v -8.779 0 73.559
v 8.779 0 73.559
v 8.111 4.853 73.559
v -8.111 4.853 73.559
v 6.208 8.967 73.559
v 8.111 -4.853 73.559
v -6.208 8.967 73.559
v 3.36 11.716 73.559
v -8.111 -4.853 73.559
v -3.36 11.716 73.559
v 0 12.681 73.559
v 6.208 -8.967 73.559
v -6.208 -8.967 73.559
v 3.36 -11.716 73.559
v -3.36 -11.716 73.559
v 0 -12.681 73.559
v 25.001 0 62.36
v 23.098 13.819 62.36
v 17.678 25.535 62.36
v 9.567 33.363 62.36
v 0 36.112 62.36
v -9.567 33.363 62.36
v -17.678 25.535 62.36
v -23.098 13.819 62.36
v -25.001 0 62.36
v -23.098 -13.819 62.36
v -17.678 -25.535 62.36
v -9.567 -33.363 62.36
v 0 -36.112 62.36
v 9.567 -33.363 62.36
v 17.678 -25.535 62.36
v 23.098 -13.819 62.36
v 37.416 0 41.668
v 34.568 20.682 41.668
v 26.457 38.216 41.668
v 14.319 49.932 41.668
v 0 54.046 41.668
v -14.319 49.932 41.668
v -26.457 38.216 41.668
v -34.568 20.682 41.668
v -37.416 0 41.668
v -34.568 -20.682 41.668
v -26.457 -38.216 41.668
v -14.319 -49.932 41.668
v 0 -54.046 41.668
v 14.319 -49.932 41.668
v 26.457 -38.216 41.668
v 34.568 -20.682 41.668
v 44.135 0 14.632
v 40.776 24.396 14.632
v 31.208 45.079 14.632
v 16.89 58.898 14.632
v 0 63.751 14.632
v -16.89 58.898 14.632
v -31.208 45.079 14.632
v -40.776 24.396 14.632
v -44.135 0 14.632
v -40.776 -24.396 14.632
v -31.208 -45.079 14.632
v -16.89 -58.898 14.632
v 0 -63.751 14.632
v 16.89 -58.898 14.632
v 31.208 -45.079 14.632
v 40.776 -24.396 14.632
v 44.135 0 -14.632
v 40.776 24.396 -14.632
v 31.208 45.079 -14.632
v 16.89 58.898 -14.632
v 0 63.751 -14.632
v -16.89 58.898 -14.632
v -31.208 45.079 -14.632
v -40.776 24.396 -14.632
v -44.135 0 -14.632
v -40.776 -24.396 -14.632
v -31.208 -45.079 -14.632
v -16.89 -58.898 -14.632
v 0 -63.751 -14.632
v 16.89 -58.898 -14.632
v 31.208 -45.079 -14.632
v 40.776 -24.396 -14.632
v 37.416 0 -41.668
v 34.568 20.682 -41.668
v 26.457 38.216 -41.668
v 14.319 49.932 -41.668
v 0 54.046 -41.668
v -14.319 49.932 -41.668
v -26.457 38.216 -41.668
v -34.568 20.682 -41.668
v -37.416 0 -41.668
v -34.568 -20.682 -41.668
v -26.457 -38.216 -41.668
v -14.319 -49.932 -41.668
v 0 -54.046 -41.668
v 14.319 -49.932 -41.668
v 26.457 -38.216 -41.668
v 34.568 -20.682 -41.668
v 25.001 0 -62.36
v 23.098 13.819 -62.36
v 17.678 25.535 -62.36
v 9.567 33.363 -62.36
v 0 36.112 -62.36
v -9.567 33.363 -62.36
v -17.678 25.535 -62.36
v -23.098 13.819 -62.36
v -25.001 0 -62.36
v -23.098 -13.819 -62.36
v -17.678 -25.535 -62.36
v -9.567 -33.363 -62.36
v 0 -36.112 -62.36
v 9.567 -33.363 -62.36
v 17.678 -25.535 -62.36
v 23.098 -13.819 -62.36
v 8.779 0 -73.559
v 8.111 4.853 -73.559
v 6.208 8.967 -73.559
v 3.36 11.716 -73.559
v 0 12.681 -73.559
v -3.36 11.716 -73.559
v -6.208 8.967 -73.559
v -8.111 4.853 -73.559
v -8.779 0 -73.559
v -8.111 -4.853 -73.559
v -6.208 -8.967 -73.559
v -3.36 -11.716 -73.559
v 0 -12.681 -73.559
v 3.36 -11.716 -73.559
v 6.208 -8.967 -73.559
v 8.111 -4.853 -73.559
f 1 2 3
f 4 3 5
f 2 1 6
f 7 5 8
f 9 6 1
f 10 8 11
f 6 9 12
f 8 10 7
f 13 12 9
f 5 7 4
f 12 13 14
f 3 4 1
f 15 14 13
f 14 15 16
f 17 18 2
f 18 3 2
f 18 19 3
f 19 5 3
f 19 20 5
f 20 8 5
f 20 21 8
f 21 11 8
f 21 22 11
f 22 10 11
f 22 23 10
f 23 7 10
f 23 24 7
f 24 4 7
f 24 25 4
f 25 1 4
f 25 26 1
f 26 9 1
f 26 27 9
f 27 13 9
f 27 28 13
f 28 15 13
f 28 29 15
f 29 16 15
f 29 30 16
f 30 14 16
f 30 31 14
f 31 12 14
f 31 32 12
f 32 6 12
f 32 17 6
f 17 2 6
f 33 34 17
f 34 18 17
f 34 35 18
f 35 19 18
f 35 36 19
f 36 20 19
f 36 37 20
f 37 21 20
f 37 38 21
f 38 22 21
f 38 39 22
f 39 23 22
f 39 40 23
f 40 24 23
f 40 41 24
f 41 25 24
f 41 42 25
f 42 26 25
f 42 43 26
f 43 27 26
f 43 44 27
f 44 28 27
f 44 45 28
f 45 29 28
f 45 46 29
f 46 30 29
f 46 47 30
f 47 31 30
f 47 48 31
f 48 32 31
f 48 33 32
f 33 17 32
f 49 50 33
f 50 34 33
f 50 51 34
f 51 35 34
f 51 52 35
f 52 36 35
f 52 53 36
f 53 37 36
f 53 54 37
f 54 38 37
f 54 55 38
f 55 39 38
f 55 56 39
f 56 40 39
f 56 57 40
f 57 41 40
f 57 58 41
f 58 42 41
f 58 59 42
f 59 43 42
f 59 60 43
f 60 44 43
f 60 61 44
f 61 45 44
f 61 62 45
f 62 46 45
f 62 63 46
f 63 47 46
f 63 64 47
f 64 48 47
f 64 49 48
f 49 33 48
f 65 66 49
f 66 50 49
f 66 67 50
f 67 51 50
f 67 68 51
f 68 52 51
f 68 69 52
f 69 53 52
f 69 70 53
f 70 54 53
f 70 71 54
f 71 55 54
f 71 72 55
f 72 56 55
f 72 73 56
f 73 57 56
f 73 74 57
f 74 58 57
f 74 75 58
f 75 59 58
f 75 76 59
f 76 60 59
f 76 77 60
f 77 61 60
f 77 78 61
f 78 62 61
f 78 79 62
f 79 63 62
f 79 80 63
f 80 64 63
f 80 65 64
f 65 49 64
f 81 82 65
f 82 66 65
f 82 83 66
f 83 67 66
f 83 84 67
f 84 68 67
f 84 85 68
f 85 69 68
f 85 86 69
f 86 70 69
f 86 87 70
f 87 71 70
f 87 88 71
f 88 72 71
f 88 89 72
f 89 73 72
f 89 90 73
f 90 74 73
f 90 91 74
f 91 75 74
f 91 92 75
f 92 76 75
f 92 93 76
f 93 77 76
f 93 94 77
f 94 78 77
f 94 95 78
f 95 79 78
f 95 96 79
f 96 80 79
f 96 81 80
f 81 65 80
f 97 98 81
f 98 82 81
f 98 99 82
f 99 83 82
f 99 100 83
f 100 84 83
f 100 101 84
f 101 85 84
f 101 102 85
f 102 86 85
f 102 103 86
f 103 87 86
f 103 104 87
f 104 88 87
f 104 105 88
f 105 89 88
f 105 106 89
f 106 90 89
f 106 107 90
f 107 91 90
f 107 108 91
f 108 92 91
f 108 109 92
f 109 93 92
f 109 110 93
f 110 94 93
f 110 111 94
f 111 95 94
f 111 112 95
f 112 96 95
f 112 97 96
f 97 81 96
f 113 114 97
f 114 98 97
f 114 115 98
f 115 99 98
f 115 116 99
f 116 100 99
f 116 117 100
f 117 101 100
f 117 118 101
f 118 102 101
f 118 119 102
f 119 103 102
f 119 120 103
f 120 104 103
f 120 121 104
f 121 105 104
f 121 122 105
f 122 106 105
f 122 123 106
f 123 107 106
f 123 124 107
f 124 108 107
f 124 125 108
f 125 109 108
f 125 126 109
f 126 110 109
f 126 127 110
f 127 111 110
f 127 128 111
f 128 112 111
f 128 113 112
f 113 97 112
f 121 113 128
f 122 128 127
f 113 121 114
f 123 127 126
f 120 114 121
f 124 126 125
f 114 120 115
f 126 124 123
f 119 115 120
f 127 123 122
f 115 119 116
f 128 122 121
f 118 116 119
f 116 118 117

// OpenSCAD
// Generated by SolidPython 1.0.1 on 2020-07-29 00:46:49


scale(v = [9, 13, 15]) {
	sphere(r = 5);
}
/***********************************************
*********      SolidPython code:      **********
************************************************
 
# import packages: SolidPython
from solid import *
from solid.utils import *
from itertools import chain, combinations, permutations


class Resize:

    def __init__(self, scad_file):
        self.scad_file = scad_file
        #self.scad_file = import_scad(scad_file)
        # cone/cylinder param:
        self.r1 = 0
        self.r2 = 0
        self.h = 0
        # rectangular prism param:
        self.w = 0
        self.l = 0
        # ellipse param:
        self.r = 0

    # import OpenScad code (file name corresponds to shape)


    # classify shape + parameters
    def assign(self, param1, param2, param3):
        if self.scad_file == 'cone.scad':
            self.r1 = param1
            self.r2 = param2
            self.h = param3
        elif self.scad_file == 'cylinder.scad':
            self.r1 = param1
            self.r2 = param2
            self.h = param3
        elif self.scad_file == 'rectangularPrism.scad':
            self.h = param1
            self.l = param2
            self.w = param3
        else:
            self.r = param1
            self.h = param2

    # resize parameters
    def iterate(self):
        x = range(3, 20, 2)
        i = 1
        if self.scad_file == 'cone.scad':
            tempList = list(permutations(x, 2))
            for temp in tempList:
                param1 = temp[0]
                param2 = temp[1]
                filepath = 'produced_scad_files/' + 'cone' + str(param1) + '_' + str(param2) + '_' + '.scad'
                scad_render_to_file(cylinder(h=param1, r1=param2, r2=0), filepath)

        elif self.scad_file == 'cylinder.scad':
            tempList = list(permutations(x, 3))
            for temp in tempList:
                param1 = temp[0]
                param2 = temp[1]
                filepath = 'produced_scad_files/' + 'cylinder' + str(param1) + '_' + str(param2) + '_' + '.scad'
                scad_render_to_file(cylinder(h=param1, r1=param2, r2=param2), filepath)

        elif self.scad_file == 'rectangularPrism.scad':
            tempList = list(permutations(x, 3))
            for temp in tempList:
                param1 = temp[0]
                param2 = temp[1]
                param3 = temp[2]
                filepath = 'produced_scad_files/' + 'rectangularPrism' + str(param1) + '_' + str(param2) + '_' + str(
                    param3) + '.scad'
                scad_render_to_file(cube(size=(param1, param2, param3)), filepath)

        elif self.scad_file == 'ellipse.scad':
            tempList = list(permutations(x, 4))
            for temp in tempList:
                param1 = temp[0]
                param2 = temp[1]
                param3 = temp[2]
                param4 = temp[3]
                filepath = 'produced_scad_files/' + 'ellipse' + str(param1) + '_' + str(param2) + '_' + str(param3) + '_' + str(param4) + '.scad'
                scad_render_to_file(scale([param1, param2, param3])(sphere(r=param4)), filepath)

    def render_to_scadfile(self):
        scad_render_to_file(scad, 'example.scad') 
 
************************************************/
